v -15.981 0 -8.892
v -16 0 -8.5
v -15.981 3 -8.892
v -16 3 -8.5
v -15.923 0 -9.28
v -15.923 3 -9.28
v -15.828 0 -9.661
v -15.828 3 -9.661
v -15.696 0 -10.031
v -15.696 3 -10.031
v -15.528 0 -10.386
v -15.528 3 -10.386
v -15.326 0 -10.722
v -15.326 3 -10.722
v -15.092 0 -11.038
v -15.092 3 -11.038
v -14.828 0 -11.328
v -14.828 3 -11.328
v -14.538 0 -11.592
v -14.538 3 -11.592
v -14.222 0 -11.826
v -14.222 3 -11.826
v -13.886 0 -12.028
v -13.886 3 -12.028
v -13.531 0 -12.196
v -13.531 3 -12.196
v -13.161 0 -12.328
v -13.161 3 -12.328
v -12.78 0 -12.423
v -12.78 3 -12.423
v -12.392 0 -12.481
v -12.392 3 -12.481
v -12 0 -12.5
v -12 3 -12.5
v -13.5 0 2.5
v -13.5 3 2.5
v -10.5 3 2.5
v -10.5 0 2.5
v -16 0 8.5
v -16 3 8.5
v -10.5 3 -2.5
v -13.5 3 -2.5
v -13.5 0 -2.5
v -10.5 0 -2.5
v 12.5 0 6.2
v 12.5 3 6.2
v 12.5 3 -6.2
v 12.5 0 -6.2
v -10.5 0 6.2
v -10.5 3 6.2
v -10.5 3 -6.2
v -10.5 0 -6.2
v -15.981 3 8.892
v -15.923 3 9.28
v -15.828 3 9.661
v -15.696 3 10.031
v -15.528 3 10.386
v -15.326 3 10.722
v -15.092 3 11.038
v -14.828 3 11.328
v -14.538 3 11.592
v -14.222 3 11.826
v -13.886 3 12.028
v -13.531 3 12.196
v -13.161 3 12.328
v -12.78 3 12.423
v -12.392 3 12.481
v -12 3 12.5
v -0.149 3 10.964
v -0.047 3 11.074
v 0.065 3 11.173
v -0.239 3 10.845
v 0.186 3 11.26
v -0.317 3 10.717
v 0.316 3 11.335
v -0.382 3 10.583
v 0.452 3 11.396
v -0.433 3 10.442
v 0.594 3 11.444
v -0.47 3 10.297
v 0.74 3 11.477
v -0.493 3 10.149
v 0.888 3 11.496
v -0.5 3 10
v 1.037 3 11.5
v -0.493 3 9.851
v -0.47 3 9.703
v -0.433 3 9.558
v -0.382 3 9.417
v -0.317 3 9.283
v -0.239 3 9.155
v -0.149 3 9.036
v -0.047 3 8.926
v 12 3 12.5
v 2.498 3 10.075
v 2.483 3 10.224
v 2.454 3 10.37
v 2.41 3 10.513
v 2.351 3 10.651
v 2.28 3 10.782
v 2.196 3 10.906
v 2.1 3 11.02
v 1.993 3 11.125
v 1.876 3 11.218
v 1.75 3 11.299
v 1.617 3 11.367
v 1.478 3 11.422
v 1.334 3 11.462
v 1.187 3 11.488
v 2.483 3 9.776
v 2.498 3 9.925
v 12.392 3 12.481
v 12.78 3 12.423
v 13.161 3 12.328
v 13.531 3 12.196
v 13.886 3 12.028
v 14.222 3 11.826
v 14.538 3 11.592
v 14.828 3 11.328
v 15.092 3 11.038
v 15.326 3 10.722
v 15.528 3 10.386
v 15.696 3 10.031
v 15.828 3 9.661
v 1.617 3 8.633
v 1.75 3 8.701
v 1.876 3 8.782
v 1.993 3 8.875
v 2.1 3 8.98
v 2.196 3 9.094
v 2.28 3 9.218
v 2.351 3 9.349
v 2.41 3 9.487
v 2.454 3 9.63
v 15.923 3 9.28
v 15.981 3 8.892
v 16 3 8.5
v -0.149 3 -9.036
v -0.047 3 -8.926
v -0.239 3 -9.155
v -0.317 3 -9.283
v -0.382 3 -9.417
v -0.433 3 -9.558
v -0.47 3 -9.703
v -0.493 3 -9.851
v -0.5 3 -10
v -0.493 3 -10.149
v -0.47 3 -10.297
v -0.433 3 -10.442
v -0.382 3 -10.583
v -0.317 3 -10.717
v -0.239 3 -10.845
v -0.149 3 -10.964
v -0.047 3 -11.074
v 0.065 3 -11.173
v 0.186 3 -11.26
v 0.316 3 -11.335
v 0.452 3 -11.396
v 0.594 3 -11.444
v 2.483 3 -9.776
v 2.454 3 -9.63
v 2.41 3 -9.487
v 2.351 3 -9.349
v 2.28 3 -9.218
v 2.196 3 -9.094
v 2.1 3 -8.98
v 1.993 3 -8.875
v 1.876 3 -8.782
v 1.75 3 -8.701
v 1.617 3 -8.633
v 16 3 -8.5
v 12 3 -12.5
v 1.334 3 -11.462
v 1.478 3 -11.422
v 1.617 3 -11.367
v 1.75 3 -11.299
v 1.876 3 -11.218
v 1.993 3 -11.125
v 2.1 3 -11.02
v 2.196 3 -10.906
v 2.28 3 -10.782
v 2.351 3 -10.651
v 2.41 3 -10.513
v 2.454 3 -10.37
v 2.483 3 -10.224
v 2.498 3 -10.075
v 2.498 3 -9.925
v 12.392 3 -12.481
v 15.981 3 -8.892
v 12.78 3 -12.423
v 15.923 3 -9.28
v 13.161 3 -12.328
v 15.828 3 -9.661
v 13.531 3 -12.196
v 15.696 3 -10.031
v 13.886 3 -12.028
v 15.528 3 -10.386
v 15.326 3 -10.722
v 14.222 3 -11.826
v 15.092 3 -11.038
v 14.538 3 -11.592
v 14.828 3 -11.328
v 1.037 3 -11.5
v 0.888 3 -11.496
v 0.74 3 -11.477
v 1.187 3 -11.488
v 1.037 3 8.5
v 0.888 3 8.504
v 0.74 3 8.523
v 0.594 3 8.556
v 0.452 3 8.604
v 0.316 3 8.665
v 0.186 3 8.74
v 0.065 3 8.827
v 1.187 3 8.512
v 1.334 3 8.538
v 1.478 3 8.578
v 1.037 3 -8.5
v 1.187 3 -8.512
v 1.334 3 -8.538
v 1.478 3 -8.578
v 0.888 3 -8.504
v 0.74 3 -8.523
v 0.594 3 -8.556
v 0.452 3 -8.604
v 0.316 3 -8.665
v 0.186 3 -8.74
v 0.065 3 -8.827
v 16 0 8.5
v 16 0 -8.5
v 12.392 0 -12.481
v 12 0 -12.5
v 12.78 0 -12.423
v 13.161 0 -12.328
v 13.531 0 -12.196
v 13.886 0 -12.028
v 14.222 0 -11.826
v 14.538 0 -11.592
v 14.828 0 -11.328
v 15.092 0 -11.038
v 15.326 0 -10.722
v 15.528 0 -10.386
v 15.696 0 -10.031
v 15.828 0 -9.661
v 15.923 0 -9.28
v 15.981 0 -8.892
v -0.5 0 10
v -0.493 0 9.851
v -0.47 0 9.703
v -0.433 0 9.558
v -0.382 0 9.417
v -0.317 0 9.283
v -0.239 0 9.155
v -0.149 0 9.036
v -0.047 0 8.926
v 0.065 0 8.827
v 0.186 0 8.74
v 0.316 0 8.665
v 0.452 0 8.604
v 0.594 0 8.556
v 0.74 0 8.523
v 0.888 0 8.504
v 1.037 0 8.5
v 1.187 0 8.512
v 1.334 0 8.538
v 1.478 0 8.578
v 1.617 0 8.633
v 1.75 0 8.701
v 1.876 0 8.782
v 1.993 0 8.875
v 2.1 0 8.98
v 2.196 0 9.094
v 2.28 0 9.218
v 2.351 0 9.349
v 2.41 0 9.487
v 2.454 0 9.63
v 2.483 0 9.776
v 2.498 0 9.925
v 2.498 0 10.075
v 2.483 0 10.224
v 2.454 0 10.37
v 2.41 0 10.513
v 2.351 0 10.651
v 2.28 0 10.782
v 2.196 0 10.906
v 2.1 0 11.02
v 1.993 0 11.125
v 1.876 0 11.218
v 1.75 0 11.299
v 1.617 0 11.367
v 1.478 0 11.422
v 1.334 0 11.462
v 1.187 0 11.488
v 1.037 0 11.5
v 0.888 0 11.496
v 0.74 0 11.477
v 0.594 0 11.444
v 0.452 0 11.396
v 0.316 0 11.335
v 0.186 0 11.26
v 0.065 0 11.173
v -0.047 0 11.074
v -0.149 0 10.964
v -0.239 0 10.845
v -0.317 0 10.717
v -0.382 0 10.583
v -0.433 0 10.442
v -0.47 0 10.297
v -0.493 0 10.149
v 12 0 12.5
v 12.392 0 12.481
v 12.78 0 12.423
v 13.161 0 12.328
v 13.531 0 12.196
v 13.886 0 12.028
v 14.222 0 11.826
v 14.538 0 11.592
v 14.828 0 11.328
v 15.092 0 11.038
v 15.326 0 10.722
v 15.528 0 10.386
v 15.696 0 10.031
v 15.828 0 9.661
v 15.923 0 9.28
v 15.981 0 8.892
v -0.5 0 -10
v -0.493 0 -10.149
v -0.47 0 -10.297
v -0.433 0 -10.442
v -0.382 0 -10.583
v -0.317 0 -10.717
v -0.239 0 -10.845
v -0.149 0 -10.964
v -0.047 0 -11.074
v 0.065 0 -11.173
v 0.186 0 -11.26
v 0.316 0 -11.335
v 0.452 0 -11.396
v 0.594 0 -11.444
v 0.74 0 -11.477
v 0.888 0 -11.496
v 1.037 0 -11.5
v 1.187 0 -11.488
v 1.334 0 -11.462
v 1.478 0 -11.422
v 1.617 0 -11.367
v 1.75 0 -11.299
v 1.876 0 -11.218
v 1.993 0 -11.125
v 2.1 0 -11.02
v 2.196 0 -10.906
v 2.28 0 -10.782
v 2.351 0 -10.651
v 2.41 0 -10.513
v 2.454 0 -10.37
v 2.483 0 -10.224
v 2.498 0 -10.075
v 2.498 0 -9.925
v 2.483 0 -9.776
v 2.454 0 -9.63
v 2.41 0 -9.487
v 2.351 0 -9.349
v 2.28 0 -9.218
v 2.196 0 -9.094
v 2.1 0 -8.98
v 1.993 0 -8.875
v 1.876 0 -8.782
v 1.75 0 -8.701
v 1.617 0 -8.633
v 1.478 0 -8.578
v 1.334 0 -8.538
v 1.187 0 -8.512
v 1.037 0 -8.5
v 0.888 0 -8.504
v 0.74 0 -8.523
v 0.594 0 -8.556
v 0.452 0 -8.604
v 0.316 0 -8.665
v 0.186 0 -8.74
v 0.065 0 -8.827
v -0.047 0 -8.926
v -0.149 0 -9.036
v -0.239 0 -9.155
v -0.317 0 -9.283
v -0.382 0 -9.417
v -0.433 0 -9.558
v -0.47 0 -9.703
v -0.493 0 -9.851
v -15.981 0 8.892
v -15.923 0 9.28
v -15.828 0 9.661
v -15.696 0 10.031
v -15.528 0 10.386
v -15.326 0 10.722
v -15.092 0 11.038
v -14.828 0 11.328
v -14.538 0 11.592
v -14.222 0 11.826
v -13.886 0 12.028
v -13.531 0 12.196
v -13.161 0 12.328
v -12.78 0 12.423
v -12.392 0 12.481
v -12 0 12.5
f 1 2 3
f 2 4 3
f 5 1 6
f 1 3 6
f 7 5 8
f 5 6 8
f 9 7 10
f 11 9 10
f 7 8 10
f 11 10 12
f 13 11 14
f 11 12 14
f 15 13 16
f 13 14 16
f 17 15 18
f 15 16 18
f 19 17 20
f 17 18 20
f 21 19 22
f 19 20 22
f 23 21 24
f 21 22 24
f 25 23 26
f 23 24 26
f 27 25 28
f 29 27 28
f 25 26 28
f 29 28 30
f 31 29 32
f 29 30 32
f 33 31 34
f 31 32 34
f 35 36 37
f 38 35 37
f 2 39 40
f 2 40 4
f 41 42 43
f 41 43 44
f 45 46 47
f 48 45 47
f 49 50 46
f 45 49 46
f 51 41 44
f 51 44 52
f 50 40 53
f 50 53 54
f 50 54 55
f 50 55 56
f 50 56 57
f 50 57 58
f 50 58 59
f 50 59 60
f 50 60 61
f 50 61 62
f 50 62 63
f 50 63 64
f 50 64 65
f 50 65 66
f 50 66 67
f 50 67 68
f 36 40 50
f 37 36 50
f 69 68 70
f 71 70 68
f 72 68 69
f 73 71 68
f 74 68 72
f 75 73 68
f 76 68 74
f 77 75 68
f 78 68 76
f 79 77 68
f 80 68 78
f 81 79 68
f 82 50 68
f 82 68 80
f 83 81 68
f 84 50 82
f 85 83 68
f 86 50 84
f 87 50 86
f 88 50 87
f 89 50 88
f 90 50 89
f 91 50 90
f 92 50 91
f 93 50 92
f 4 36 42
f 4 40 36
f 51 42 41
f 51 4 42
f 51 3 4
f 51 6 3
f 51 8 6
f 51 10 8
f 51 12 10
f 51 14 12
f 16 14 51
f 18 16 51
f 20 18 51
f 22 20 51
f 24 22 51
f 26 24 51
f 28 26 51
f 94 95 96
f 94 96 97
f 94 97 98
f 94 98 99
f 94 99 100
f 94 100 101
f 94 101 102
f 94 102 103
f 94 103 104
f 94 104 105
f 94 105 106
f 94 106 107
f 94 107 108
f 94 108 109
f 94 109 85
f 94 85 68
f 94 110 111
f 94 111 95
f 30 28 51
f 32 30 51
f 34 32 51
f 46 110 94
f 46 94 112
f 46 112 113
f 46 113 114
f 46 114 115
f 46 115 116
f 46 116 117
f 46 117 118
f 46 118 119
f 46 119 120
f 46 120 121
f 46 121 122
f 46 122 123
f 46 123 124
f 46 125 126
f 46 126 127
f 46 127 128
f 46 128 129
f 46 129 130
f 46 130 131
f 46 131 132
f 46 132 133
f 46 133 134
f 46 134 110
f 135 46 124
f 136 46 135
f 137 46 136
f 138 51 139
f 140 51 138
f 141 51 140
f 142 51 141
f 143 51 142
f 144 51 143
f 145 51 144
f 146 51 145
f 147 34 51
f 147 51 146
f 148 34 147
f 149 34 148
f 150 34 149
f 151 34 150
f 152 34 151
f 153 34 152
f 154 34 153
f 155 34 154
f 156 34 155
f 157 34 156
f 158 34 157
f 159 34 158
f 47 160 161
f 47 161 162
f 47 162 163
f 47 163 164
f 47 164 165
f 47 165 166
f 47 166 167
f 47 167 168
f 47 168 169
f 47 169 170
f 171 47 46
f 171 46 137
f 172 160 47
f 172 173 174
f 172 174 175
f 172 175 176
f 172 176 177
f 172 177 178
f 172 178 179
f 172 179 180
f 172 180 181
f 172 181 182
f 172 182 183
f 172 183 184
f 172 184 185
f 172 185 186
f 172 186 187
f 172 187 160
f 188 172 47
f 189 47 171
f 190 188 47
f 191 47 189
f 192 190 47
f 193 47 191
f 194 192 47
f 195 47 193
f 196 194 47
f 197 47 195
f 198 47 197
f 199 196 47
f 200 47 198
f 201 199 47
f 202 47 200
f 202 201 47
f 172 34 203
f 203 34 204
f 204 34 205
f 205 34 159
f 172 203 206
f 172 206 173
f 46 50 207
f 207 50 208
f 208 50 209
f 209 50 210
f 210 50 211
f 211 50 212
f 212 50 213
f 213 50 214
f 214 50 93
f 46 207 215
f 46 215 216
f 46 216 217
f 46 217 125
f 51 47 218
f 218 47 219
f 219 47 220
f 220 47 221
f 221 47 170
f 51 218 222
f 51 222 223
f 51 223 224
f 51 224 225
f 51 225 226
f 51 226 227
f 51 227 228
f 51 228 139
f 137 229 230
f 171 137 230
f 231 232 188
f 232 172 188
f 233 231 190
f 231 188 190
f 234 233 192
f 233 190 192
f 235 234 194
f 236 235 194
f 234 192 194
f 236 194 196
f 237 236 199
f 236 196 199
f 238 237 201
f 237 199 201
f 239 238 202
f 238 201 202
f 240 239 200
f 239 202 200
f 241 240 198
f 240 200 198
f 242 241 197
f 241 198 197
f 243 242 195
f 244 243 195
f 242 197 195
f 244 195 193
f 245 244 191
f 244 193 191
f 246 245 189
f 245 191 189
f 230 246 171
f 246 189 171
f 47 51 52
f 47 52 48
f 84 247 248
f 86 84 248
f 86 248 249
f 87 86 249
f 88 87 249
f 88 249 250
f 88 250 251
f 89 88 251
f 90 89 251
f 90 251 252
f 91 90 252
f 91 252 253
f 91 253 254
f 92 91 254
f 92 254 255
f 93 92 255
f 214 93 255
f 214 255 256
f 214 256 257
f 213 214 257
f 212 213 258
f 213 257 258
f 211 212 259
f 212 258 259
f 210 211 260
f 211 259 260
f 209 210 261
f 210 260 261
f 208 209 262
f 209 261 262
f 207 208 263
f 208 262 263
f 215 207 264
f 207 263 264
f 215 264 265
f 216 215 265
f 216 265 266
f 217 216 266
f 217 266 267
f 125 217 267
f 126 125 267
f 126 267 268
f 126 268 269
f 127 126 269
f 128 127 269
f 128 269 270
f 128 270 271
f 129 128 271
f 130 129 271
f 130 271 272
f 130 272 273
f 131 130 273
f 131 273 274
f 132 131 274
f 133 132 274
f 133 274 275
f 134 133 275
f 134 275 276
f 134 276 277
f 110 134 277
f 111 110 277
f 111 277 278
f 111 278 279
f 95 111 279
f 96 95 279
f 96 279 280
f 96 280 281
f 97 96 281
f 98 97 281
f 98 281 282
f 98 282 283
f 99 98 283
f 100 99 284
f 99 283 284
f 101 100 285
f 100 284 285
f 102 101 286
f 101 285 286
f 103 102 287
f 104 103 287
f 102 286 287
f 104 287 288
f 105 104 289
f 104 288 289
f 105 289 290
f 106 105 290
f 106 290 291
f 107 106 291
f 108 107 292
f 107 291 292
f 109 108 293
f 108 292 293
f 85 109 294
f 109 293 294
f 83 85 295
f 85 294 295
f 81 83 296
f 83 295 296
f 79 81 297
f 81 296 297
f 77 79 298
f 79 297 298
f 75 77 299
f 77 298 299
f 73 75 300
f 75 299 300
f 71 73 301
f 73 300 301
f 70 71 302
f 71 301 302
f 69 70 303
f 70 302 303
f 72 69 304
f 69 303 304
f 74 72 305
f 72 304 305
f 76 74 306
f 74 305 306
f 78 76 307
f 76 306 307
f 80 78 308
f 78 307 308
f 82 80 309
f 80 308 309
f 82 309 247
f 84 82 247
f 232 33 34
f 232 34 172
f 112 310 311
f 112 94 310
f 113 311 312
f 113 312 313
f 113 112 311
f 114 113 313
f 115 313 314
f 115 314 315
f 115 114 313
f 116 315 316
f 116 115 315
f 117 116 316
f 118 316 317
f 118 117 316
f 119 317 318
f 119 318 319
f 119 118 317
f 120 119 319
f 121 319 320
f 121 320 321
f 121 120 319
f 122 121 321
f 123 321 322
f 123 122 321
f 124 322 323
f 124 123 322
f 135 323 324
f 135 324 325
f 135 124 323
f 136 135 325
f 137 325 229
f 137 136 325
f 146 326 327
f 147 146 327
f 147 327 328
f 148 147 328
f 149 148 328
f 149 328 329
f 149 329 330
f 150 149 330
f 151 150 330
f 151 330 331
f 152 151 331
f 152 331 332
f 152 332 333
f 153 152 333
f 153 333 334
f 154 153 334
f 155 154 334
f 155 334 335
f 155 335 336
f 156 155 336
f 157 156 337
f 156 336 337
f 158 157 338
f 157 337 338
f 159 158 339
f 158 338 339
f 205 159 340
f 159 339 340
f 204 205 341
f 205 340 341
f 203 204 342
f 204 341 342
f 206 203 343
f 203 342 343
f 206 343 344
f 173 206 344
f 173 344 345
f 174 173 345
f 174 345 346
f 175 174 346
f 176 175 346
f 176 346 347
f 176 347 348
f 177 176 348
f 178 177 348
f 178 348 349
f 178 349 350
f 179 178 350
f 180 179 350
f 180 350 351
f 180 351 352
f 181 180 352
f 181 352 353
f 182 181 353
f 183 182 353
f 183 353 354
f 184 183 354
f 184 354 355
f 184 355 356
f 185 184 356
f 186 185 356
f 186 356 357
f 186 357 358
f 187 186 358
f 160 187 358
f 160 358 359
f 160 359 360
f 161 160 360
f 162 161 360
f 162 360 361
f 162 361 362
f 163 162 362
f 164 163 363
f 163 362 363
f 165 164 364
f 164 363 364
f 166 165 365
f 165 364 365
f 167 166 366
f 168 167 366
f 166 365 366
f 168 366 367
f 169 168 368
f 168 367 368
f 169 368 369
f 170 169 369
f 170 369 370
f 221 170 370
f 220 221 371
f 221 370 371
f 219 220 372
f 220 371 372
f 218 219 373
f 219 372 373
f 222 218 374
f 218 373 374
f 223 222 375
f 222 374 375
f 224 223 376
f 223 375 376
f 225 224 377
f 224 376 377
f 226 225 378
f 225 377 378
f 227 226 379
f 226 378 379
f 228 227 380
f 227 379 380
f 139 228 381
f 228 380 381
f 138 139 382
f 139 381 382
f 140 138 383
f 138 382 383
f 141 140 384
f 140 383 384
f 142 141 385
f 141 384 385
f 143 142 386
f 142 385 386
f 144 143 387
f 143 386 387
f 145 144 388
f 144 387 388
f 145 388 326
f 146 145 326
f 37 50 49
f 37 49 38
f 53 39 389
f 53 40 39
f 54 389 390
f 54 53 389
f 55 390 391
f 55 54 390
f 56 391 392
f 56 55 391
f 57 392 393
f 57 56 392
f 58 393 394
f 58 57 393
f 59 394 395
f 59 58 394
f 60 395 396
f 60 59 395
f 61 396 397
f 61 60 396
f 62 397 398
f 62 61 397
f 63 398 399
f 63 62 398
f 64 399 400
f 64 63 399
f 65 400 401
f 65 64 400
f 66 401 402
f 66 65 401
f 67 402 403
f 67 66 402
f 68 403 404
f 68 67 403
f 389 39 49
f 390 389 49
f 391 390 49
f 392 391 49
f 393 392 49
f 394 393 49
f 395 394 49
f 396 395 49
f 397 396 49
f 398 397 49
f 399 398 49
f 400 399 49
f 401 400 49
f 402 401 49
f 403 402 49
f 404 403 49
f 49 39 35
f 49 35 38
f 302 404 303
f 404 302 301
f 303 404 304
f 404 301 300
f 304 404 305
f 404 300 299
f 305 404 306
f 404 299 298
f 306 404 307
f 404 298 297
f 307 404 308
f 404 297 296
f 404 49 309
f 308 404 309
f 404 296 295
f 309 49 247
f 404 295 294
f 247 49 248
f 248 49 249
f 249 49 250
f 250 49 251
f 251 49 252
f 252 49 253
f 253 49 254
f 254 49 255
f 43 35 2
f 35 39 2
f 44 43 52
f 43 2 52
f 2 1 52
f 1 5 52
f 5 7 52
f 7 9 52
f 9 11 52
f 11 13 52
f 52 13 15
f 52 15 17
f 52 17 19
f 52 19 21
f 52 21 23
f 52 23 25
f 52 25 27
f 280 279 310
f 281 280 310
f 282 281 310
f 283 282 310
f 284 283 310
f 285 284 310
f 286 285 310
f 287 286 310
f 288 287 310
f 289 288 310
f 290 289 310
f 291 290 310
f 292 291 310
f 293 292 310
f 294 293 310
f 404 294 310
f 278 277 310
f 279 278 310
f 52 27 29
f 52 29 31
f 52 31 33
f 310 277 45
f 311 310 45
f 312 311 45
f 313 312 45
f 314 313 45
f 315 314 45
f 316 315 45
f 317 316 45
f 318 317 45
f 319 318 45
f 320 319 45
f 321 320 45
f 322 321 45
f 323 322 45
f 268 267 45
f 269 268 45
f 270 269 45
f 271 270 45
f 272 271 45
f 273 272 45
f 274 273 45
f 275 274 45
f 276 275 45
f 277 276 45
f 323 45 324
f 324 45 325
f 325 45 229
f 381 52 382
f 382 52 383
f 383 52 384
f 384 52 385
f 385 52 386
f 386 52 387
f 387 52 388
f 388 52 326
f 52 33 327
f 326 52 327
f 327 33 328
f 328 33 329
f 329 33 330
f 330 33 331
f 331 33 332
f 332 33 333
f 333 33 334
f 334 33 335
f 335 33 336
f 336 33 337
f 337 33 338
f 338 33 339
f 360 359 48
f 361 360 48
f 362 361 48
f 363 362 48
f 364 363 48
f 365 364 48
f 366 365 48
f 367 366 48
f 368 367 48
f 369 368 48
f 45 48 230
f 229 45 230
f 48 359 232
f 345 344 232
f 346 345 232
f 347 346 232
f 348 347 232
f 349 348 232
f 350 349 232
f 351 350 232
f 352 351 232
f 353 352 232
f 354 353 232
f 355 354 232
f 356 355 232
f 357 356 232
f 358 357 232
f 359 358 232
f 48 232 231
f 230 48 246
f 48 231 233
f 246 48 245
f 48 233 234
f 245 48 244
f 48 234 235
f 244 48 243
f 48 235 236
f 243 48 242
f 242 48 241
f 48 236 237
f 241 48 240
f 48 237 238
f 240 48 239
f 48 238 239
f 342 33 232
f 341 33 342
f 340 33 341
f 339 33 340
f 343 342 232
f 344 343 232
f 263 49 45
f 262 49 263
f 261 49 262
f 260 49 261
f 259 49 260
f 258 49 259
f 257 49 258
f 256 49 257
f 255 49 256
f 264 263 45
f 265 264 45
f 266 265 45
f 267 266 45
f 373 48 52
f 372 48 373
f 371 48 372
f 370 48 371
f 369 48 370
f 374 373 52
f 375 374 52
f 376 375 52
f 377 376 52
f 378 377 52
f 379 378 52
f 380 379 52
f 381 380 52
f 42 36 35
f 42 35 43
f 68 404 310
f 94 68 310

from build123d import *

# Parameters (mm, degrees)
ESBO_O1_W                  = 32
ESBO_O1_H                  = 25
RESSALTO_EXTRUS_O1_DEPTH   = 3
PERFIL_CORTE_W             = 23
PERFIL_CORTE_H             = 12.4
CORTE_PRINCIPAL_DEPTH      = 81.646945091
FURO_DE_DI_METRO_3_0_3_1_D = 3
ESBO_O6_W                  = 3
ESBO_O6_H                  = 5
CORTE_EXTRUS_O2_DEPTH      = 81.150651679
FILETE1_R                  = 4


with BuildPart() as part:
    # Esboço1 → Ressalto-extrusão1 (new body)
    with BuildSketch(Plane(origin=(0, 0, 0), x_dir=(1, 0, 0), z_dir=(0, 1, 0))):
        Rectangle(ESBO_O1_W, ESBO_O1_H)
    extrude(amount=RESSALTO_EXTRUS_O1_DEPTH)

    # Perfil Corte → Corte Principal (cut, through all)
    with BuildSketch(Plane(origin=(-56.229726339, 3, 23.246277925), x_dir=(1, 0, 0), z_dir=(0, 1, 0))):
        with Locations((57.229726339, 23.246277925)):
            Rectangle(PERFIL_CORTE_W, PERFIL_CORTE_H)
    extrude(amount=-CORTE_PRINCIPAL_DEPTH, mode=Mode.SUBTRACT)

    # Furo de diâmetro Ø3.0 (3)1 (through all)
    with Locations(Plane(origin=(-54.773419901, 3, 25), x_dir=(1, 0, 0), z_dir=(0, 1, 0))):
        with Locations((55.773419901, 35), (55.773419901, 15)):
            Hole(FURO_DE_DI_METRO_3_0_3_1_D / 2)

    # Esboço6 → Corte-extrusão2 (cut, through all)
    with BuildSketch(Plane(origin=(-54.773419901, 3, 25), x_dir=(1, 0, 0), z_dir=(0, 1, 0))):
        with Locations((42.773419901, 25)):
            Rectangle(ESBO_O6_W, ESBO_O6_H)
    extrude(amount=-CORTE_EXTRUS_O2_DEPTH, mode=Mode.SUBTRACT)

    # Filete1
    filete1_edges = [part.edges().sort_by_distance(p)[0] for p in [
        (16, 1.5, 12.5),
        (-16, 1.5, 12.5),
        (-16, 1.5, -12.5),
        (16, 1.5, -12.5),
    ]]
    fillet(filete1_edges, radius=FILETE1_R)


solid = part.part
